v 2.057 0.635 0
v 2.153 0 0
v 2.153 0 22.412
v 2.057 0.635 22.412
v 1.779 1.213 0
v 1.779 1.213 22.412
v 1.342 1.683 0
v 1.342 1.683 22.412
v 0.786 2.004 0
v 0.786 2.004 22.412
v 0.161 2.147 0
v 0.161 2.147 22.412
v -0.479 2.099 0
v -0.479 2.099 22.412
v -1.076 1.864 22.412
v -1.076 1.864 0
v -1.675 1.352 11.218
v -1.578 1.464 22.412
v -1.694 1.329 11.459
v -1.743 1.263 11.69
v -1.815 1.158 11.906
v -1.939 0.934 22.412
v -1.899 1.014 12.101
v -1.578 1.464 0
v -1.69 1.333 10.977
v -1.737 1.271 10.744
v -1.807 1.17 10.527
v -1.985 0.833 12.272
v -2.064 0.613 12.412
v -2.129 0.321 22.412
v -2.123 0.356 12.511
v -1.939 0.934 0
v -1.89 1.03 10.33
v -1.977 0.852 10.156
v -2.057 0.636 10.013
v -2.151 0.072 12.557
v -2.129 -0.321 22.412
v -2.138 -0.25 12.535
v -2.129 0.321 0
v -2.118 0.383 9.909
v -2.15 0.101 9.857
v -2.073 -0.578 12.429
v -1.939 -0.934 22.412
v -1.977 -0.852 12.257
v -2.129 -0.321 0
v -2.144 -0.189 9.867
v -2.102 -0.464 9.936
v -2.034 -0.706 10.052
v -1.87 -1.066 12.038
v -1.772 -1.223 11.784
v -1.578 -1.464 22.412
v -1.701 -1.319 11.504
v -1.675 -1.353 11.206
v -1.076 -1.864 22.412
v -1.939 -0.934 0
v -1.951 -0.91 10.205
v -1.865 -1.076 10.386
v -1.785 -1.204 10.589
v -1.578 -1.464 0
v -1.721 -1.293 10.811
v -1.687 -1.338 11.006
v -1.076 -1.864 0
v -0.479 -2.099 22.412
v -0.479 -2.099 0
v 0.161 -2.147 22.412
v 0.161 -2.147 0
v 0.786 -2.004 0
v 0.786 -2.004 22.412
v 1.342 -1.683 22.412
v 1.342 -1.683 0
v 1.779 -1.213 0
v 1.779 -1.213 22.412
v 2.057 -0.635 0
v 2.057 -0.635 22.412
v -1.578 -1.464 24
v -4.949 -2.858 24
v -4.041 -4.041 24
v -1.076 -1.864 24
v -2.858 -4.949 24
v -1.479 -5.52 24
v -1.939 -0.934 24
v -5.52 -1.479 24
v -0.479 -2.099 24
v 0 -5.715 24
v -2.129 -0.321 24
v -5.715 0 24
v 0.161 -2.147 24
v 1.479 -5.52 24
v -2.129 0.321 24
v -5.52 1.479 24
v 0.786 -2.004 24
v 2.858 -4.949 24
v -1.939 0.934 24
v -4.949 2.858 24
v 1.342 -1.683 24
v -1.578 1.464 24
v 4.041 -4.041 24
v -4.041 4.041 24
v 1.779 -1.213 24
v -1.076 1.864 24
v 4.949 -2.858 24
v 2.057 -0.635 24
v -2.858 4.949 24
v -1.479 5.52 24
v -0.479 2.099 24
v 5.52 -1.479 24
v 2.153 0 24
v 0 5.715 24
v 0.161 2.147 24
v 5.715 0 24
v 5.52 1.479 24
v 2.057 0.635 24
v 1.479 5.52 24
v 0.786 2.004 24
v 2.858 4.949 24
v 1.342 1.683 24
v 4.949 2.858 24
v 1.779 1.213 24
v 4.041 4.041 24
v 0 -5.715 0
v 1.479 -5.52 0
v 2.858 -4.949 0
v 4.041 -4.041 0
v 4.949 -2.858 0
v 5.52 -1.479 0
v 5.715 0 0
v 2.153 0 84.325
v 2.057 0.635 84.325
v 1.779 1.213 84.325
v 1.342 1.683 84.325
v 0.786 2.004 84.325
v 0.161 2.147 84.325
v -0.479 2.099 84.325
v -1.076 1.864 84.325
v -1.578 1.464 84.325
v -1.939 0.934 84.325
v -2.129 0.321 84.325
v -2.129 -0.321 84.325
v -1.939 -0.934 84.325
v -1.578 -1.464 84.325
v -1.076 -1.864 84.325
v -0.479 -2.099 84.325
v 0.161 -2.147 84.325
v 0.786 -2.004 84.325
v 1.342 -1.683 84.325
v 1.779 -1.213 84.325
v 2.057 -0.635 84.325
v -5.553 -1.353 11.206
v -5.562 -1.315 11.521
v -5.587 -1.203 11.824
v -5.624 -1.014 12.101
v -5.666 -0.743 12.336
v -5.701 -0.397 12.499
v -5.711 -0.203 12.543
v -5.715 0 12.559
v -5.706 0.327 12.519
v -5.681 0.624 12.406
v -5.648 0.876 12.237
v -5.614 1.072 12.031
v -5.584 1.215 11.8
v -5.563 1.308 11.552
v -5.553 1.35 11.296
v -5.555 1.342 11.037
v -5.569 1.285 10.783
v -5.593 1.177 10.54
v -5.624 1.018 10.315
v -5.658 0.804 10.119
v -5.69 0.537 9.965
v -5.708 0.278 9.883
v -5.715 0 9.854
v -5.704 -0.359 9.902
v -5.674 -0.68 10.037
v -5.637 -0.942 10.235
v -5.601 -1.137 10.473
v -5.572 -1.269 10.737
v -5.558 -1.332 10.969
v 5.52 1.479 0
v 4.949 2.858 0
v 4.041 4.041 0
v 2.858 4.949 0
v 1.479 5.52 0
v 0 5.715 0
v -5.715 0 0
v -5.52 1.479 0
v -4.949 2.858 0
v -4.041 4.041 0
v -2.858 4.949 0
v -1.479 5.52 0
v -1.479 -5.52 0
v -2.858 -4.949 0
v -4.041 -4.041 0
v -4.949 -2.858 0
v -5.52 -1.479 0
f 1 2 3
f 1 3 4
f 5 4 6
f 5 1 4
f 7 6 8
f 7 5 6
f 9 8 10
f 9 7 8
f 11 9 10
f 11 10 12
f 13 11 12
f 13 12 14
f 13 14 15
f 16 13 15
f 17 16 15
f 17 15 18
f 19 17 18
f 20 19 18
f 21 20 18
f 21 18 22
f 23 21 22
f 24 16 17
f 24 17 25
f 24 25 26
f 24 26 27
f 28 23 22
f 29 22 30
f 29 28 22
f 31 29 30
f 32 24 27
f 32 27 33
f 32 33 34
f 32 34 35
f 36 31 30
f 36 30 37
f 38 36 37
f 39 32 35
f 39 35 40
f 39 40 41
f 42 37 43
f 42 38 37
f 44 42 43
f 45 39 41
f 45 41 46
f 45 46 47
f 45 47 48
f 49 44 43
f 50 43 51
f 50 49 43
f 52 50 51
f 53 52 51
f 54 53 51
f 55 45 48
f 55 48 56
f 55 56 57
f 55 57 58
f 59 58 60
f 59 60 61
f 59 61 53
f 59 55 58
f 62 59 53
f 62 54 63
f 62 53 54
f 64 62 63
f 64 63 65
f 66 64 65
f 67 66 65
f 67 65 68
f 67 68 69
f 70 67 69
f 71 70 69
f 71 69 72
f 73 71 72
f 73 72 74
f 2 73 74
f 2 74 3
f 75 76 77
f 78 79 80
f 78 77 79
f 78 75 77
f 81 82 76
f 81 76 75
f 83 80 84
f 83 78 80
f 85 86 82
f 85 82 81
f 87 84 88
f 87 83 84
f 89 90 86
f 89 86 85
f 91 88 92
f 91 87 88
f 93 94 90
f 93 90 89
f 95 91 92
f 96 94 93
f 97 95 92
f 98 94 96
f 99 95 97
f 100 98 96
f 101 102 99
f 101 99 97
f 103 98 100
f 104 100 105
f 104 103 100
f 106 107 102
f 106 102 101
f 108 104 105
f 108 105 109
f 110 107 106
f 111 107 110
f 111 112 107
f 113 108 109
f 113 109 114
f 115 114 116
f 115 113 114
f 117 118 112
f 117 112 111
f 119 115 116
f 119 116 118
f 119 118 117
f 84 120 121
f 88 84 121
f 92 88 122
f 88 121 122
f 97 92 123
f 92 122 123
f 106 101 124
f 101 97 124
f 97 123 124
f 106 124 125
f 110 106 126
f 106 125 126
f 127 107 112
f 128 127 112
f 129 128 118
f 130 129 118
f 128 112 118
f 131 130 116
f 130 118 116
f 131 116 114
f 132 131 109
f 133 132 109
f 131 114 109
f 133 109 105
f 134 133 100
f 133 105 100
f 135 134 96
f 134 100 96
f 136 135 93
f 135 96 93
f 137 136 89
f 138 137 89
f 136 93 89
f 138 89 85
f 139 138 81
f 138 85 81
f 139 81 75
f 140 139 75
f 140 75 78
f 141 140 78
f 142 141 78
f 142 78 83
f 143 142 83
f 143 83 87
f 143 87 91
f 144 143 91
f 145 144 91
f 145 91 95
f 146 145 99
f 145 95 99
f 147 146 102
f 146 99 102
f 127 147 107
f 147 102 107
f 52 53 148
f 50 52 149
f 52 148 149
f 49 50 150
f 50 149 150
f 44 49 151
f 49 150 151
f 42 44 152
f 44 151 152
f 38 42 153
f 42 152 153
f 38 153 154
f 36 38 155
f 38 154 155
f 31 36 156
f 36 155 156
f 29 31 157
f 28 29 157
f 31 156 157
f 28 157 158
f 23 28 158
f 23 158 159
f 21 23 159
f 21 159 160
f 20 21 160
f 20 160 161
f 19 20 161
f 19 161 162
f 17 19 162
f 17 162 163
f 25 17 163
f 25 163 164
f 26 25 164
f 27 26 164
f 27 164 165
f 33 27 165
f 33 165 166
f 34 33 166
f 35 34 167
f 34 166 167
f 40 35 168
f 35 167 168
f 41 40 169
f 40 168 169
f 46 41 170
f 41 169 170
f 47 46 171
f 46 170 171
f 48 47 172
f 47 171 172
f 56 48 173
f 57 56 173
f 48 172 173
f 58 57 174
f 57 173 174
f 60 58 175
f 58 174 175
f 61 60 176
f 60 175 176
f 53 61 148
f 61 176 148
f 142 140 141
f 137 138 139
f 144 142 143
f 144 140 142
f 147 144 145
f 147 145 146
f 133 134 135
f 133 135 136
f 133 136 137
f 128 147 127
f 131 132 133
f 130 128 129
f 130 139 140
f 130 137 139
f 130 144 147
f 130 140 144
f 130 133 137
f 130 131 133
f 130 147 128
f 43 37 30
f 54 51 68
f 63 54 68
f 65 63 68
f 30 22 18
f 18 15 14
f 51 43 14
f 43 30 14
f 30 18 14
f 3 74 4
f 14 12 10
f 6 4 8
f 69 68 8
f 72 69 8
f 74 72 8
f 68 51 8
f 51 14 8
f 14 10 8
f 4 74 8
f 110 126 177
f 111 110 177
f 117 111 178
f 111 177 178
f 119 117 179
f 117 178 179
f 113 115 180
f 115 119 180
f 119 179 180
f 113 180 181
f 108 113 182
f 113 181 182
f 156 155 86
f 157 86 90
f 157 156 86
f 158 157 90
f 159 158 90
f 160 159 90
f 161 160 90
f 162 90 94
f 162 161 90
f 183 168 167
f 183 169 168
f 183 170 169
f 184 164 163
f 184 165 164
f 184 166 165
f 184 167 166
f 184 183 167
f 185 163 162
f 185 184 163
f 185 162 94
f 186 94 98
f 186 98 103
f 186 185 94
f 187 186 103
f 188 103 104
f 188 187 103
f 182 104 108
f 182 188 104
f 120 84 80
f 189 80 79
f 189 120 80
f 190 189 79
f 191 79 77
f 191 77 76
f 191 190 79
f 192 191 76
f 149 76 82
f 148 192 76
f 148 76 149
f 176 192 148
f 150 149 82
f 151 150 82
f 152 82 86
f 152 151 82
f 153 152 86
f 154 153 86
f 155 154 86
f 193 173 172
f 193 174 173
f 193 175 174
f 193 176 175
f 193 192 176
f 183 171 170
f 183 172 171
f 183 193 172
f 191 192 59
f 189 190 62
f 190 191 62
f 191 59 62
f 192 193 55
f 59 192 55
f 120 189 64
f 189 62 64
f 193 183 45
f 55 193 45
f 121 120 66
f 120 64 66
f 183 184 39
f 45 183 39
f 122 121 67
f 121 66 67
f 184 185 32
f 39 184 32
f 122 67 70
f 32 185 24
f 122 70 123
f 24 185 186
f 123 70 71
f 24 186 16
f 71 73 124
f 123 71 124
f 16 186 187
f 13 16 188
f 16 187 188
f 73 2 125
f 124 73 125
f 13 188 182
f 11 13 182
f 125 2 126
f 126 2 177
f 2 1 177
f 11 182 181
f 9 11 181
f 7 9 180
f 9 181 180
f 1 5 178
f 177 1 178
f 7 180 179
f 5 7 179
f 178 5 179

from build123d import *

# Parameters (mm, degrees)
F0_W        = 11.43
F0_H        = 11.43
F0_R        = 2.15265
F1_DEPTH    = 22.4125
F2_W        = 11.43
F2_H        = 11.43
F3_DEPTH    = 1.5875
F4_R        = 1.35255
F5_REACH    = 15.2565891076
F6_T1_DEPTH = 52.575
F7_R        = 2.15265
F8_DEPTH    = 60.325


# Not quite as in the source:
# - a fillet or chamfer that OpenCascade refuses, or shapes differently, is made with other operations: its cross-section is extruded or revolved along the edge and cut away or added


with BuildPart() as f1:
    # F0 (on Top) → F1 (new body)
    with BuildSketch(Plane.XY):
        Rectangle(F0_W, F0_H)
        Circle(F0_R, mode=Mode.SUBTRACT)
    extrude(amount=F1_DEPTH)

    # F2 (on face) → F3 (join)
    with BuildSketch(Plane.XY.offset(22.4125)):
        Rectangle(F2_W, F2_H)
    extrude(amount=F3_DEPTH)

    f5_end = f1.faces().sort_by_distance((-2.15265, 0, 11.20625))[0]
    # F4 (on face) → F5 (cut, up to a face of the model that its end follows)
    with BuildSketch(Plane(origin=(-5.715, 0, 0), x_dir=(0, -1, 0), z_dir=(-1, 0, 0))):
        with Locations((0, 11.20625)):
            Circle(F4_R)
    f5_long = extrude(amount=-F5_REACH, mode=Mode.PRIVATE)
    add(split(f5_long, bisect_by=f5_end, keep=Keep.ALL, mode=Mode.PRIVATE).solids().sort_by_distance((-5.715, 0, 11.20625))[0], mode=Mode.SUBTRACT)

    # F6: fillet of radius 5.715 on 4 edges, made by hand

    # F6_s2 → F6_t1 (cut)
    with BuildSketch(Plane.XY.offset(-14.2875)):
        with BuildLine():
            ThreePointArc((0, -5.715), (-4.0411152545, -4.0411152545), (-5.715, 0))
            Line((-5.715, 0), (-5.715, -5.715))
            Line((-5.715, -5.715), (0, -5.715))
        make_face()
        with BuildLine():
            ThreePointArc((0, -5.715), (4.0411152545, -4.0411152545), (5.715, 0))
            Line((5.715, 0), (5.715, -5.715))
            Line((5.715, -5.715), (0, -5.715))
        make_face()
        with BuildLine():
            ThreePointArc((-5.715, 0), (-4.0411152545, 4.0411152545), (0, 5.715))
            Line((0, 5.715), (-5.715, 5.715))
            Line((-5.715, 5.715), (-5.715, 0))
        make_face()
        with BuildLine():
            ThreePointArc((5.715, 0), (4.0411152545, 4.0411152545), (0, 5.715))
            Line((0, 5.715), (5.715, 5.715))
            Line((5.715, 5.715), (5.715, 0))
        make_face()
    extrude(amount=F6_T1_DEPTH, mode=Mode.SUBTRACT)

    # F7 (on face) → F8 (join)
    with BuildSketch(Plane.XY.offset(24)):
        Circle(F7_R)
    extrude(amount=F8_DEPTH)


solid = f1.part
